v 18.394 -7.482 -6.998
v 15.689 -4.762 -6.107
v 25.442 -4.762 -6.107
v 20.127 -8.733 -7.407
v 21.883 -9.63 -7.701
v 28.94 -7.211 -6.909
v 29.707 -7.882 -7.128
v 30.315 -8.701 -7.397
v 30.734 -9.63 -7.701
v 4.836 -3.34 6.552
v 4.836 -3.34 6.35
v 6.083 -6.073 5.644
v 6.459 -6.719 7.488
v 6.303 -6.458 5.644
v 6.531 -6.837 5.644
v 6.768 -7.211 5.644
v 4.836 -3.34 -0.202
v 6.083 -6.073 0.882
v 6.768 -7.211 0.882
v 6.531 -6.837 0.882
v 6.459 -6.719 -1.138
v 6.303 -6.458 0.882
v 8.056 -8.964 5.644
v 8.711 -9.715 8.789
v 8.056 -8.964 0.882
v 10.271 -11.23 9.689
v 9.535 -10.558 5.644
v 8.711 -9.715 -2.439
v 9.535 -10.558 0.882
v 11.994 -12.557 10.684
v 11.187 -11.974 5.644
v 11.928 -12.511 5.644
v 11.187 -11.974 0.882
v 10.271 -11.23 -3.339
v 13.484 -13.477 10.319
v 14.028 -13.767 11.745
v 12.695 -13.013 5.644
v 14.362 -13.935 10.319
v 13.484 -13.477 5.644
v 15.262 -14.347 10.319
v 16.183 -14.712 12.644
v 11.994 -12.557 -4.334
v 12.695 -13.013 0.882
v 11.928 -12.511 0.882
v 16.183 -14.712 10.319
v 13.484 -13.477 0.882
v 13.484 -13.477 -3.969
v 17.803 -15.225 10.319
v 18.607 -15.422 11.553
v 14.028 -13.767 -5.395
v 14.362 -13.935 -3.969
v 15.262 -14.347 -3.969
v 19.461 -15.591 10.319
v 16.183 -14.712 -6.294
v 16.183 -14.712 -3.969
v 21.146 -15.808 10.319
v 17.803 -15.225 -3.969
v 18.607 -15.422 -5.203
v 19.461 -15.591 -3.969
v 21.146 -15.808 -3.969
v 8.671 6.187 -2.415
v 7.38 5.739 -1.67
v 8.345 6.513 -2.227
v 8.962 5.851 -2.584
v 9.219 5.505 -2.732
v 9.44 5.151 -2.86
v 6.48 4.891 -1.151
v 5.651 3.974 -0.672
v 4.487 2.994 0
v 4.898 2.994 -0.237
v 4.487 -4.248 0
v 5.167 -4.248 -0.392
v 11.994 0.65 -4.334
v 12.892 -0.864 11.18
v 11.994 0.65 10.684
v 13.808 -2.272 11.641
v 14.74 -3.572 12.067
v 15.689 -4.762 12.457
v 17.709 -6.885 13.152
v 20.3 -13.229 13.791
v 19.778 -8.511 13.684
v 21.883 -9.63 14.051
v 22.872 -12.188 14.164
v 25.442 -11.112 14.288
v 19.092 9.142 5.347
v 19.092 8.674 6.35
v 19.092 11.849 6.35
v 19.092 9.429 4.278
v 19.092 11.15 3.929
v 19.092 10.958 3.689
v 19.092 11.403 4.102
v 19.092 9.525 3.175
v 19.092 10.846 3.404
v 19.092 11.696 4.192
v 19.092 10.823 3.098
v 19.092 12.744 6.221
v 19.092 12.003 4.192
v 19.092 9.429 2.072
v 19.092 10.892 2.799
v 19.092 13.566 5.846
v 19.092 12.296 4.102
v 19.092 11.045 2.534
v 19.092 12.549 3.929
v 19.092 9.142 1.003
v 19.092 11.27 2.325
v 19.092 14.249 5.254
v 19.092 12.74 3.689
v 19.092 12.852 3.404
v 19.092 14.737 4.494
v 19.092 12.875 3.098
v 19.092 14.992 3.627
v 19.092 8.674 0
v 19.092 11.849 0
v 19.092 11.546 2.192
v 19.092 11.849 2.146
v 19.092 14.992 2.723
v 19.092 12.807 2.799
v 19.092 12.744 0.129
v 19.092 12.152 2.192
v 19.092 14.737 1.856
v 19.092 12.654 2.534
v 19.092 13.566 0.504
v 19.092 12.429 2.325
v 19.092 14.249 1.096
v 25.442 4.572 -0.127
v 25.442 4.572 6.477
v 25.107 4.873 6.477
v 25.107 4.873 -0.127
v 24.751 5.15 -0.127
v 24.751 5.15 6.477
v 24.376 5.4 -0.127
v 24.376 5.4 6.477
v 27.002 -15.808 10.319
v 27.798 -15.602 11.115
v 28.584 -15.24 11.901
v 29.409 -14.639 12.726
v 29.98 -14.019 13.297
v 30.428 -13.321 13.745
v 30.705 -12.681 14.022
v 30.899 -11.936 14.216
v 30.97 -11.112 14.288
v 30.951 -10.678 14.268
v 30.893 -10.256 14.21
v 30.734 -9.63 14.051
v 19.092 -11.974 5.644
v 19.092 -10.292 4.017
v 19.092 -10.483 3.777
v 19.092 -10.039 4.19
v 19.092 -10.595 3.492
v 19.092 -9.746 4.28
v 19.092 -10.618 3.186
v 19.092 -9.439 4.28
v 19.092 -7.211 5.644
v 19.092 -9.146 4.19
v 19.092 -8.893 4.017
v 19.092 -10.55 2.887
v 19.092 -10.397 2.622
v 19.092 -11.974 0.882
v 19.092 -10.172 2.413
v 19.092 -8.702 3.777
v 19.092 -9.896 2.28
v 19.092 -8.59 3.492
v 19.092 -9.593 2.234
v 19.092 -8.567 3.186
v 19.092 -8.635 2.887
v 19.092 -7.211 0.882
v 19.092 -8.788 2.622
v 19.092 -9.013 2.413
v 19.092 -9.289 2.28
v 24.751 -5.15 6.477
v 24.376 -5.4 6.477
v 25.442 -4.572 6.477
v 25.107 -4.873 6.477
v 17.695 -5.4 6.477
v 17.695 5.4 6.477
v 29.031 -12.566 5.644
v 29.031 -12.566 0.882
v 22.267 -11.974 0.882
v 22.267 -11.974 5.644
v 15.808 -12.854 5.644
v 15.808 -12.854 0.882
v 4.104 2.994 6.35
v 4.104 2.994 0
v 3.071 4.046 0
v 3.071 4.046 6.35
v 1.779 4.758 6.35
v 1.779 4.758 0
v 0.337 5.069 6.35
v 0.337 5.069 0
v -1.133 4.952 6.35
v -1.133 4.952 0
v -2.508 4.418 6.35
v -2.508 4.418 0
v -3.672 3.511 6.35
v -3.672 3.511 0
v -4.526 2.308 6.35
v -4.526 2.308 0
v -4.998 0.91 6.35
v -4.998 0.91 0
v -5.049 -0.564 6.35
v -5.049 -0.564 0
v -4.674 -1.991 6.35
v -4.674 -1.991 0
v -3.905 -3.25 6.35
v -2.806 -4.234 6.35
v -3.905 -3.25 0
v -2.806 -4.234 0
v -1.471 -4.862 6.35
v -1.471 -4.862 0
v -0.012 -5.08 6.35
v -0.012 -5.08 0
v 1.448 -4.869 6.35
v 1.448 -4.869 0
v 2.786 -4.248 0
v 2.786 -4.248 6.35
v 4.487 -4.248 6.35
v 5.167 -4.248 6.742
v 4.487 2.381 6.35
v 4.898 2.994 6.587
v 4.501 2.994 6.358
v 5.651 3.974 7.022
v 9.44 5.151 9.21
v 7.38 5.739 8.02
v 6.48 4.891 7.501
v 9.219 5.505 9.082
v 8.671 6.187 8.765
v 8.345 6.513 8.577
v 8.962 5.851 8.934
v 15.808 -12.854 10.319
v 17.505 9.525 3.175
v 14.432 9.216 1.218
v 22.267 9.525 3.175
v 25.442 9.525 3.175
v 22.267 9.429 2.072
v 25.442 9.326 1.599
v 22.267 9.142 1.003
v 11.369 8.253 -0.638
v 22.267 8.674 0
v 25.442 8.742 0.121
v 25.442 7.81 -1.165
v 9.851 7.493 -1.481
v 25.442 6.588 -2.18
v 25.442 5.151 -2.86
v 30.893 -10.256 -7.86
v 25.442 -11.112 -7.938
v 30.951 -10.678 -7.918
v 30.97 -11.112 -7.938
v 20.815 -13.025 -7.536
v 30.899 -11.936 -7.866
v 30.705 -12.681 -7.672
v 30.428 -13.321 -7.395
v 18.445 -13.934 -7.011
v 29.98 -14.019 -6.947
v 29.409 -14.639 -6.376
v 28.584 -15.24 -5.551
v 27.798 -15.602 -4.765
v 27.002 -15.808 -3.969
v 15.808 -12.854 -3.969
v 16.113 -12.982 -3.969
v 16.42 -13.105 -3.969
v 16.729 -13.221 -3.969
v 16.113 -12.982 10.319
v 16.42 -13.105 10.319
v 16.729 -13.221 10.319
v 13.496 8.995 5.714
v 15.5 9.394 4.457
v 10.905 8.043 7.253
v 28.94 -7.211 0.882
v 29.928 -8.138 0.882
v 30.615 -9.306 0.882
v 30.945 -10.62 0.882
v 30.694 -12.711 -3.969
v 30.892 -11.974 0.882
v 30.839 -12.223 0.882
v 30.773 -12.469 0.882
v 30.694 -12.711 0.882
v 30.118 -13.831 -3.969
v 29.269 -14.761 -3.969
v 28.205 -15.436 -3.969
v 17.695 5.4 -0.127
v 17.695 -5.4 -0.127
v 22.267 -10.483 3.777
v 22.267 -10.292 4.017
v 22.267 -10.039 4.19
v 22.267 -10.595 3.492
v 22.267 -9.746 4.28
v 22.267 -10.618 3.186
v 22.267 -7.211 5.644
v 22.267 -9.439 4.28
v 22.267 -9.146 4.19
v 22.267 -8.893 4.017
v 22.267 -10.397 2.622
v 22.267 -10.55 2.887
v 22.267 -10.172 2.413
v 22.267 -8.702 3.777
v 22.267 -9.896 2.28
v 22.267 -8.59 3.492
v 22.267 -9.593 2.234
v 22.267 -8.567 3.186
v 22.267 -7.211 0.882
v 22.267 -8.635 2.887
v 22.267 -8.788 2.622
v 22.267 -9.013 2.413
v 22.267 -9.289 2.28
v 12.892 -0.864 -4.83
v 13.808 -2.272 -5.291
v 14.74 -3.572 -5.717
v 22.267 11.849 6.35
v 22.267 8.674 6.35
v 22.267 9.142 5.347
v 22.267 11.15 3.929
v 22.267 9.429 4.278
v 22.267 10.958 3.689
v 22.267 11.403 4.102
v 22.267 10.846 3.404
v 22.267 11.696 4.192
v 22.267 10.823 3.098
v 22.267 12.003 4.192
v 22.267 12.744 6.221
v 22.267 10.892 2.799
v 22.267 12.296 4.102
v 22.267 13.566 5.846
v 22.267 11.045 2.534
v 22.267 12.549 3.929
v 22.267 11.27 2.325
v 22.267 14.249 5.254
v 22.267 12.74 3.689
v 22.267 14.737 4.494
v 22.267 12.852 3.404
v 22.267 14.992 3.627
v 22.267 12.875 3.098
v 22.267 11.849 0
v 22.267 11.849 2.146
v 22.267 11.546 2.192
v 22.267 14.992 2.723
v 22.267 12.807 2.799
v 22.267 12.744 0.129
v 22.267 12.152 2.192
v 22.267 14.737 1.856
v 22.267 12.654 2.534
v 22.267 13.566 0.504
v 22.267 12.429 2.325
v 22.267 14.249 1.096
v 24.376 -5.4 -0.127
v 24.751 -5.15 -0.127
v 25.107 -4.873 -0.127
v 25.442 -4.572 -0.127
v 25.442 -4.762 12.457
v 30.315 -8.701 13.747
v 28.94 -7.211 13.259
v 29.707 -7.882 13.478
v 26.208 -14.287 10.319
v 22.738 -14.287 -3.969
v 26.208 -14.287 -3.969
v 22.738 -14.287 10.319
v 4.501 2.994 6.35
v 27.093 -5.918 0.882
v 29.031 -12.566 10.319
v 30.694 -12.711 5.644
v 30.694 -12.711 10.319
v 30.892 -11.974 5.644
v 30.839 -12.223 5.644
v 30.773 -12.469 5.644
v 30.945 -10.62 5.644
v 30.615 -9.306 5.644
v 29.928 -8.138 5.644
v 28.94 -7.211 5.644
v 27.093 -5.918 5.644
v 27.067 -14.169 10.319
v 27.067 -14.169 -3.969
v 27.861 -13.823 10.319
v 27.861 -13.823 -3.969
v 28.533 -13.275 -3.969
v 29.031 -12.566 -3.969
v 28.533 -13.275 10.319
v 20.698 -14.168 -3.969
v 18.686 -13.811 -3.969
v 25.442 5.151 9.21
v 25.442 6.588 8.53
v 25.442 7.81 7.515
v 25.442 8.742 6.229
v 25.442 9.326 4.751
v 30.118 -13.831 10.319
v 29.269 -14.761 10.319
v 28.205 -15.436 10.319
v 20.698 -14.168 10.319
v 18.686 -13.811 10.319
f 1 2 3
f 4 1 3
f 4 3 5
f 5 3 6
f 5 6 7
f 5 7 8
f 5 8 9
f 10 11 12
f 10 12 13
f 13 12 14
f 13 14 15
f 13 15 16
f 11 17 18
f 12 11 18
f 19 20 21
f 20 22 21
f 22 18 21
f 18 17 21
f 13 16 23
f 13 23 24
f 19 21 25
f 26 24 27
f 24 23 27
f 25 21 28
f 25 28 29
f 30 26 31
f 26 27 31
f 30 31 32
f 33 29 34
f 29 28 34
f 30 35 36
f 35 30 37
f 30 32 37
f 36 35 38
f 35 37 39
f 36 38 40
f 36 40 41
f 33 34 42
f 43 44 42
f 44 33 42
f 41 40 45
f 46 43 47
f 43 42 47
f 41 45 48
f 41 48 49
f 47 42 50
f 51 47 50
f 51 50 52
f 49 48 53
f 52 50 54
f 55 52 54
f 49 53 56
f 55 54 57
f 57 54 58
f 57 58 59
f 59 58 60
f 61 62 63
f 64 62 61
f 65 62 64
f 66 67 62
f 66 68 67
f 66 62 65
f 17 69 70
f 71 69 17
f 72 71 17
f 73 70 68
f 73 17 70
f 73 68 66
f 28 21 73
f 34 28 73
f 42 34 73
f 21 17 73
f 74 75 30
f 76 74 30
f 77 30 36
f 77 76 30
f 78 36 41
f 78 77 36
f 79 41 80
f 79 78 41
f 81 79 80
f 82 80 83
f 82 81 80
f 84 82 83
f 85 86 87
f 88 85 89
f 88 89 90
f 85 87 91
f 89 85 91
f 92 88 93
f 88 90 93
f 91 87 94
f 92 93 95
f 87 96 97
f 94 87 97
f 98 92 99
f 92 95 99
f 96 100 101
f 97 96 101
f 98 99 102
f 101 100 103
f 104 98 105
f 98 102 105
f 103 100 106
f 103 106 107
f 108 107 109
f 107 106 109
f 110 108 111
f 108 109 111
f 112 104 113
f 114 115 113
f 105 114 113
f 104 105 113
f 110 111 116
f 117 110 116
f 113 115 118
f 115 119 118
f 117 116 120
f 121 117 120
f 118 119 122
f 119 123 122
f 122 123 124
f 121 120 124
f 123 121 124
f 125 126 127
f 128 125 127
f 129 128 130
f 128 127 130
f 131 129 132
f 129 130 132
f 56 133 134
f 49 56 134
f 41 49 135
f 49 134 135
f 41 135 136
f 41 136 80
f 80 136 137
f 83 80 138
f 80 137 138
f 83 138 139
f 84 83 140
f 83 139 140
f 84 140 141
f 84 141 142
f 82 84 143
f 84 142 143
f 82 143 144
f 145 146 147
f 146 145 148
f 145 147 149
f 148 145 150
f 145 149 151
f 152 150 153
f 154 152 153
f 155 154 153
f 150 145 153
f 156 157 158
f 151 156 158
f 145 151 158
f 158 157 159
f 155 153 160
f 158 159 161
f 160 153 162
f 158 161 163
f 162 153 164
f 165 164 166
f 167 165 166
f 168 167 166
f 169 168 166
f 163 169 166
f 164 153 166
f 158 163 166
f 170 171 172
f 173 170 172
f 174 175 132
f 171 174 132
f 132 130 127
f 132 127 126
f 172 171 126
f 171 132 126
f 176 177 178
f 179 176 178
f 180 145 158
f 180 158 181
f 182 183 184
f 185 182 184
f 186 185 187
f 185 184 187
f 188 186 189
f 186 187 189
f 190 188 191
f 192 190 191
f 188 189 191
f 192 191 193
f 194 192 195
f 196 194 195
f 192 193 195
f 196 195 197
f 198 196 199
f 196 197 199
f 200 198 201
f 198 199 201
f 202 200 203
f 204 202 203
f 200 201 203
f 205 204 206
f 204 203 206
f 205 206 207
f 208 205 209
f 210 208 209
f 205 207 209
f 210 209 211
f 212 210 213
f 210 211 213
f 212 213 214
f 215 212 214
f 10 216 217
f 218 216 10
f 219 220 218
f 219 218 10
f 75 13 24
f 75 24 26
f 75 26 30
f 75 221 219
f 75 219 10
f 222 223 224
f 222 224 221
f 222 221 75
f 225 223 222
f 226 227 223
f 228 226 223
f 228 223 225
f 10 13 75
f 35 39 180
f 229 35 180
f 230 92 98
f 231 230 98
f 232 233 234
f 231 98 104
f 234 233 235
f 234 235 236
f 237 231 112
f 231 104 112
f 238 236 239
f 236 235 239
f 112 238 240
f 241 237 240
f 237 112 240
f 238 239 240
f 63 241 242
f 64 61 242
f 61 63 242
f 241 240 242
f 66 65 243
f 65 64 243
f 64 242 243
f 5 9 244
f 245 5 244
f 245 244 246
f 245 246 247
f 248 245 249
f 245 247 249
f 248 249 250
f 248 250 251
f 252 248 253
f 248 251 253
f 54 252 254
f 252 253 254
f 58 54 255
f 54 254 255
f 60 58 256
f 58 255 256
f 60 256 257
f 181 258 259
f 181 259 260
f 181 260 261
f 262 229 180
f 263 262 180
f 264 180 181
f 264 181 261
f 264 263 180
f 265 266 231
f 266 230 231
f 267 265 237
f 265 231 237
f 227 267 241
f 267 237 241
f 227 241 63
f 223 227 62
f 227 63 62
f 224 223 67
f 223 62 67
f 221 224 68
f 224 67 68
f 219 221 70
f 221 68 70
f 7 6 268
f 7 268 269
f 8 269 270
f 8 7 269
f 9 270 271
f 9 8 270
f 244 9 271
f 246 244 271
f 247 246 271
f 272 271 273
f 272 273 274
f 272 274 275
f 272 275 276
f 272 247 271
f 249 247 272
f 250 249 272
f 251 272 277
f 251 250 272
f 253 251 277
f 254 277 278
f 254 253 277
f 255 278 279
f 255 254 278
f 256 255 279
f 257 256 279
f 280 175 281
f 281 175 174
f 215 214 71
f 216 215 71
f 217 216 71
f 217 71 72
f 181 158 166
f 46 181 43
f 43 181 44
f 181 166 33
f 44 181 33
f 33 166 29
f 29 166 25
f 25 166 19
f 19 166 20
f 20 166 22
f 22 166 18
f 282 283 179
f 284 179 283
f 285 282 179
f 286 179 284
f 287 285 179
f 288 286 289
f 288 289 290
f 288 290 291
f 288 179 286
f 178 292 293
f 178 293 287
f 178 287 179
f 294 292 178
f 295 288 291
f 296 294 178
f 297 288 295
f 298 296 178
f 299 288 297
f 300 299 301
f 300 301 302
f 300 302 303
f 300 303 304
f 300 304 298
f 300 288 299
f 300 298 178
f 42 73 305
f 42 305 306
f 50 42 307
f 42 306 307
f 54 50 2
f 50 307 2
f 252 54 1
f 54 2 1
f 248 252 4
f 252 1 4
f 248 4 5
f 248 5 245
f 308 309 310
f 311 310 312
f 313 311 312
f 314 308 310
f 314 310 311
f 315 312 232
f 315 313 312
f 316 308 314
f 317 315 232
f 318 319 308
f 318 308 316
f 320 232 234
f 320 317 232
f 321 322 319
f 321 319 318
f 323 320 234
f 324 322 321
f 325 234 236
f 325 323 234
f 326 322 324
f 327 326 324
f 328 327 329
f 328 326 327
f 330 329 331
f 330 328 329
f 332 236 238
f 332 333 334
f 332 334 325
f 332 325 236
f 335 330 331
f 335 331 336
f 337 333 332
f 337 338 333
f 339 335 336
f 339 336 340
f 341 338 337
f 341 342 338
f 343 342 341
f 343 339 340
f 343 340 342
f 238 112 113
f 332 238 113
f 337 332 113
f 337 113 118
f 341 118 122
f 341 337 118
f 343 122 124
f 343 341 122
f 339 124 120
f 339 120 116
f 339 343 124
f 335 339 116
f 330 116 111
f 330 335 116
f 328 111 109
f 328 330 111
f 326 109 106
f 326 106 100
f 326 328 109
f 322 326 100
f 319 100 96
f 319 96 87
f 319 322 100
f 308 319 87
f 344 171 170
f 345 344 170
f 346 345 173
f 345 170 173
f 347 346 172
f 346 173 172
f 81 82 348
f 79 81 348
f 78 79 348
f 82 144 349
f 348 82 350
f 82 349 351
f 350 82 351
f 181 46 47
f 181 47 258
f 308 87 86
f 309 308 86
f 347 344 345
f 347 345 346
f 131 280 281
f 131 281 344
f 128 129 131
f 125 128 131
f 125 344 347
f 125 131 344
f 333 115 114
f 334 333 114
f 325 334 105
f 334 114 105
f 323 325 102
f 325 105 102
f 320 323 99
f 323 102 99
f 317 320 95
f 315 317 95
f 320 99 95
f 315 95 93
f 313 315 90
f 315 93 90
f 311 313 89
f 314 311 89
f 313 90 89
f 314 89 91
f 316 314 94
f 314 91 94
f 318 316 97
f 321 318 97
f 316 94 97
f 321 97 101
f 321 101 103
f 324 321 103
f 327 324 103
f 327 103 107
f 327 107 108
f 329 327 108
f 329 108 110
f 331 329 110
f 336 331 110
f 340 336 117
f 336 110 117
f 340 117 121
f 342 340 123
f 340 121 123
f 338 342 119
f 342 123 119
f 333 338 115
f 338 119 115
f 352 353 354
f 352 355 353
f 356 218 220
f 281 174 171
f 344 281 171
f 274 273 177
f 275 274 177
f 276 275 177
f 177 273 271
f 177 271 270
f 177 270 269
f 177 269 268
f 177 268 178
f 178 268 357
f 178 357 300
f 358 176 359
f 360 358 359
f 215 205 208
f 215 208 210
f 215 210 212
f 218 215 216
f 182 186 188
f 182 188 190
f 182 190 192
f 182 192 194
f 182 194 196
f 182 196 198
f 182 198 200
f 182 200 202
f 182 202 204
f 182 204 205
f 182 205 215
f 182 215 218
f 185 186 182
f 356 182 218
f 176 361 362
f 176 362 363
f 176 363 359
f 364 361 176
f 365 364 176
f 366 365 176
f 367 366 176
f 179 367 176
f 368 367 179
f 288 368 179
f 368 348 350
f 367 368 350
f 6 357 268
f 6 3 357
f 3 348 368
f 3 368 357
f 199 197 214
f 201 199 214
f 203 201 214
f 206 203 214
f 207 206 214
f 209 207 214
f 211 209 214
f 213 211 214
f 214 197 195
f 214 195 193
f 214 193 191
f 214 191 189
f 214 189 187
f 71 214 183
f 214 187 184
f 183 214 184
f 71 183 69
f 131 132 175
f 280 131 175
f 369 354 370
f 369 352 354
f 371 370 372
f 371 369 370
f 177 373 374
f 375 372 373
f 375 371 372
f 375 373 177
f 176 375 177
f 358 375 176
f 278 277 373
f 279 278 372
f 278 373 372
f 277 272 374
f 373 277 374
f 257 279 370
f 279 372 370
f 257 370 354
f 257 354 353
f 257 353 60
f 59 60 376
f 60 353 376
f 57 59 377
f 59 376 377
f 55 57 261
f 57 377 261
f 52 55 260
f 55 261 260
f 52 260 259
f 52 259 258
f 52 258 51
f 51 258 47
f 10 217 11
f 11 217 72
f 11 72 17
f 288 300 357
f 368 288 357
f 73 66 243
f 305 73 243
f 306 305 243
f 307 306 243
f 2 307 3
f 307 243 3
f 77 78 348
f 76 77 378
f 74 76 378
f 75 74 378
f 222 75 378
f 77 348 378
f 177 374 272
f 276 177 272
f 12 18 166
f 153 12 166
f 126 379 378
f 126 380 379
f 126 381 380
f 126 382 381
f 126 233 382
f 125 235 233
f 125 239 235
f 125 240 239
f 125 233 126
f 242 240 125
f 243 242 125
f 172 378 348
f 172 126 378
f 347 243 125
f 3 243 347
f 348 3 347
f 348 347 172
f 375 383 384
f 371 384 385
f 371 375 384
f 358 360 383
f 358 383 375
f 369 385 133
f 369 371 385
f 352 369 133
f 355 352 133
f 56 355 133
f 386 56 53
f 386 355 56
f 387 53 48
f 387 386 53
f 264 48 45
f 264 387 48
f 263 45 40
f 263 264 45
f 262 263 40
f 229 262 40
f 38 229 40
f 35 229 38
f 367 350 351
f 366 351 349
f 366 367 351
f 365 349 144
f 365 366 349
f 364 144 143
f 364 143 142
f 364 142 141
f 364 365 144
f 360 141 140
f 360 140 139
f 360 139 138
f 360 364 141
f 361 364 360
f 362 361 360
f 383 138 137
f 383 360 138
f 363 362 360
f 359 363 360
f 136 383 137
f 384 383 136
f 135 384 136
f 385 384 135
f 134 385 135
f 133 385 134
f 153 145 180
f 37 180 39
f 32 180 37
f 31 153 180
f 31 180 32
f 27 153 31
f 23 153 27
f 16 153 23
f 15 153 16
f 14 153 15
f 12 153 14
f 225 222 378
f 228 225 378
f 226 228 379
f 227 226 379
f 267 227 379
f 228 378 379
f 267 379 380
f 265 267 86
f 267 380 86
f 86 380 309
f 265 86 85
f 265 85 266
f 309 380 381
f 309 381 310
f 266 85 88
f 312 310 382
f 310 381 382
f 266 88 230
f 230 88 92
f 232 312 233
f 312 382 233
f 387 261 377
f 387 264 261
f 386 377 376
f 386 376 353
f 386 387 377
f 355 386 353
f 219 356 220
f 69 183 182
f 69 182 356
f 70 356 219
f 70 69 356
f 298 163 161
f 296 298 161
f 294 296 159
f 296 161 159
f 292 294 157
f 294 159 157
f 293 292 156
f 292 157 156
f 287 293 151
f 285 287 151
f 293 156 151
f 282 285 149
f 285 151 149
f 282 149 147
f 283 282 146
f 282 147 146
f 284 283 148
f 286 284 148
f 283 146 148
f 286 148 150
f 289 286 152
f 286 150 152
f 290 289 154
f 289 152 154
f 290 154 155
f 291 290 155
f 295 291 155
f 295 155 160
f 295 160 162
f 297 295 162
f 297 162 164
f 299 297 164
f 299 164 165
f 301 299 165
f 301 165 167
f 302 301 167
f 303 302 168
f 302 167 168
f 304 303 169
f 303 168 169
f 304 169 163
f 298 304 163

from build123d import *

# Parameters (mm, degrees)
BOSS_EXTRUDE1_DEPTH      = 6.35
BOSS_EXTRUDE2_START      = -7.9375
BOSS_EXTRUDE2_DEPTH      = 22.225
CUT_EXTRUDE1_DEPTH       = 51.557144521
CUT_EXTRUDE2_START       = -7.9375
CUT_EXTRUDE2_DEPTH       = 25.24
CUT_EXTRUDE7_DEPTH       = 10
CUT_EXTRUDE7_DEPTH_BACK  = 19.05
CUT_EXTRUDE10_DEPTH      = 10.16
CUT_EXTRUDE10_DEPTH_BACK = 17.78
CUT_EXTRUDE8_START       = 0.127
CUT_EXTRUDE8_DEPTH       = 6.604
BOSS_EXTRUDE3_START      = -3.175
BOSS_EXTRUDE3_DEPTH      = 3.175
SKETCH14_W               = 1.0287
SKETCH14_H               = 3.176
SKETCH15_W               = 4.7625
SKETCH15_H               = 4.7625
CUT_EXTRUDE15_DEPTH      = 8.703074479
CUT_EXTRUDE16_START      = -3.175
SKETCH16_W               = 4.7625
SKETCH16_H               = 4.7625
CUT_EXTRUDE16_DEPTH      = 32.52405251
SKETCH18_W               = 1.0287
SKETCH18_H               = 3.176
CUT_EXTRUDE17_DEPTH      = 4.7625
BOSS_EXTRUDE5_REACH      = 39.621
BOSS_EXTRUDE6_DEPTH      = 6.35
BOSS_EXTRUDE8_REACH      = 39.621
CUT_EXTRUDE19_DEPTH      = 10.31875
CUT_EXTRUDE19_DEPTH_BACK = 3.96875


with BuildPart() as part:
    # Sketch2 → Boss-Extrude1 (new body)
    with BuildSketch(Plane.XY):
        with BuildLine():
            Line((4.487320853, -2.38125), (4.487320853, 2.38125))
            ThreePointArc((4.487320853, 2.38125), (-5.08, 0), (4.487320853, -2.38125))
        make_face()
    extrude(amount=BOSS_EXTRUDE1_DEPTH)


with BuildPart() as body_2:
    # Sketch3 → Boss-Extrude2 (new body)
    with BuildSketch(Plane.XY.offset(BOSS_EXTRUDE2_START)):
        Polygon((4.487320853, 9.525), (25.442320853, 9.525), (25.442320853, -4.7625), (41.312615578, -15.875), (25.442320853, -15.875), (4.487320853, -15.875), align=None)
    extrude(amount=BOSS_EXTRUDE2_DEPTH)

    # Sketch4 → Cut-Extrude1 (cut, through all)
    with BuildSketch(Plane(origin=(0, 9.525, 0), x_dir=(1, 0, 0), z_dir=(0, 1, 0))):
        with BuildLine():
            Line((4.487320853, -6.35), (11.994161802, -10.684076643))
            ThreePointArc((11.994161802, -10.684076643), (18.481041485, -13.371030185), (25.442320853, -14.2875))
            Line((25.442320853, -14.2875), (4.487320853, -14.2875))
            Line((4.487320853, -14.2875), (4.487320853, -6.35))
        make_face()
        with BuildLine():
            Line((4.487320853, 0), (11.994161802, 4.334076643))
            ThreePointArc((11.994161802, 4.334076643), (18.481041485, 7.021030185), (25.442320853, 7.9375))
            Line((25.442320853, 7.9375), (4.487320853, 7.9375))
            Line((4.487320853, 7.9375), (4.487320853, 0))
        make_face()
    extrude(amount=-CUT_EXTRUDE1_DEPTH, mode=Mode.SUBTRACT)

    # Sketch5 → Cut-Extrude2 (cut)
    with BuildSketch(Plane.XY.offset(CUT_EXTRUDE2_START)):
        with BuildLine():
            Line((4.487320853, -15.875), (4.487320853, -2.38125))
            Line((4.487320853, -2.38125), (4.836453379, -3.34048373))
            ThreePointArc((4.836453379, -3.34048373), (11.810966692, -12.429846444), (22.737597804, -15.875))
            Line((22.737597804, -15.875), (4.487320853, -15.875))
        make_face()
        with BuildLine():
            Line((4.487320853, 2.38125), (4.487320853, 9.525))
            Line((4.487320853, 9.525), (17.504820853, 9.525))
            ThreePointArc((17.504820853, 9.525), (10.080393765, 7.621692137), (4.487320853, 2.38125))
        make_face()
        with BuildLine():
            Line((26.207895332, -15.875), (41.312615578, -15.875))
            Line((41.312615578, -15.875), (28.93955311, -7.211288389))
            ThreePointArc((28.93955311, -7.211288389), (30.74997231, -12.54461137), (26.207895332, -15.875))
        make_face()
    extrude(amount=CUT_EXTRUDE2_DEPTH, mode=Mode.SUBTRACT)

    # Sketch7 → Cut-Extrude7 (cut, two sides)
    with BuildSketch(Plane(origin=(25.442320853, 0, 0), x_dir=(0, 0, -1), z_dir=(1, 0, 0))) as cut_extrude7_sk:
        with BuildLine():
            ThreePointArc((-9.525, -15.875), (-12.892596049, -14.480096041), (-14.2875, -11.112499989))
            Line((-14.2875, -11.112499989), (-14.2875, -15.875))
            Line((-14.2875, -15.875), (-9.525, -15.875))
        make_face()
        with BuildLine():
            ThreePointArc((7.9375, -11.112499982), (6.542596052, -14.480096039), (3.175, -15.875))
            Line((3.175, -15.875), (7.9375, -15.875))
            Line((7.9375, -15.875), (7.9375, -11.112499982))
        make_face()
    extrude(amount=CUT_EXTRUDE7_DEPTH, mode=Mode.SUBTRACT)
    extrude(cut_extrude7_sk.sketch, amount=-CUT_EXTRUDE7_DEPTH_BACK, mode=Mode.SUBTRACT)

    # Sketch7<4> → Cut-Extrude10 (cut, two sides)
    with BuildSketch(Plane(origin=(25.442320853, 0, 0), x_dir=(0, 0, -1), z_dir=(1, 0, 0))) as cut_extrude10_sk:
        with BuildLine():
            ThreePointArc((-9.209570672, 5.151475854), (-6.901384194, 8.316649622), (-3.175, 9.525))
            Line((-3.175, 9.525), (-14.2875, 9.525))
            Line((-14.2875, 9.525), (-14.2875, -4.7625))
            Line((-14.2875, -4.7625), (-12.456650698, -4.7625))
            Line((-12.456650698, -4.7625), (-9.209570672, 5.151475854))
        make_face()
        with BuildLine():
            Line((6.106650698, -4.7625), (7.9375, -4.7625))
            Line((7.9375, -4.7625), (7.9375, 9.525))
            Line((7.9375, 9.525), (-3.175, 9.525))
            ThreePointArc((-3.175, 9.525), (0.551384194, 8.316649622), (2.859570672, 5.151475854))
            Line((2.859570672, 5.151475854), (6.106650698, -4.7625))
        make_face()
        with BuildLine():
            ThreePointArc((7.700928004, -9.630143109), (7.877985134, -10.361942155), (7.9375, -11.112499982))
            Line((7.9375, -11.112499982), (7.9375, -4.7625))
            Line((7.9375, -4.7625), (6.106650698, -4.7625))
            Line((6.106650698, -4.7625), (7.700928004, -9.630143109))
        make_face()
        with BuildLine():
            Line((-14.050928004, -9.630143109), (-12.456650698, -4.7625))
            Line((-12.456650698, -4.7625), (-14.2875, -4.7625))
            Line((-14.2875, -4.7625), (-14.2875, -11.112499989))
            ThreePointArc((-14.2875, -11.112499989), (-14.227985135, -10.361942158), (-14.050928004, -9.630143109))
        make_face()
    extrude(amount=CUT_EXTRUDE10_DEPTH, mode=Mode.SUBTRACT)
    extrude(cut_extrude10_sk.sketch, amount=-CUT_EXTRUDE10_DEPTH_BACK, mode=Mode.SUBTRACT)

    # Sketch8 → Cut-Extrude8 (cut)
    with BuildSketch(Plane.XY.offset(6.35).offset(CUT_EXTRUDE8_START)):
        with BuildLine():
            Line((25.442320853, -4.572), (25.442320853, 4.572))
            ThreePointArc((25.442320853, 4.572), (24.931170577, 5.014670211), (24.375846843, 5.400477249))
            Line((24.375846843, 5.400477249), (17.695324263, 5.400477249))
            Line((17.695324263, 5.400477249), (17.695324263, -5.400477249))
            Line((17.695324263, -5.400477249), (24.375846843, -5.400477249))
            ThreePointArc((24.375846843, -5.400477249), (24.931170577, -5.014670211), (25.442320853, -4.572))
        make_face()
    extrude(amount=-CUT_EXTRUDE8_DEPTH, mode=Mode.SUBTRACT)

    # Sketch12 → Boss-Extrude3 (add)
    with BuildSketch(Plane(origin=(25.442320853, 0, 0), x_dir=(0, 0, -1), z_dir=(1, 0, 0)).offset(BOSS_EXTRUDE3_START)):
        with BuildLine():
            Line((-6.35, 8.674261314), (0, 8.674261314))
            Line((0, 8.674261314), (0, 11.849261314))
            ThreePointArc((0, 11.849261314), (-3.175, 15.024261314), (-6.35, 11.849261314))
            Line((-6.35, 11.849261314), (-6.35, 8.674261314))
        make_face()
    extrude(amount=-BOSS_EXTRUDE3_DEPTH)

    # Sketch14 → #1 Clearance Hole1 (revolve, cut)
    with BuildSketch(Plane(origin=(22.267320853, 11.849261314, 3.175), x_dir=(0, 0, -1), z_dir=(0, 1, 0))):
        with Locations((0.51435, 1.588)):
            Rectangle(SKETCH14_W, SKETCH14_H)
    revolve(axis=Axis((28.617320853, 11.849261314, 3.175), (-1, 0, 0)), mode=Mode.SUBTRACT)

    # Sketch15 → Cut-Extrude15 (cut)
    with BuildSketch(Plane(origin=(30.970395332, 0, 0), x_dir=(0, 0, -1), z_dir=(1, 0, 0))):
        with Locations((-3.262930867, -9.592538389)):
            Rectangle(SKETCH15_W, SKETCH15_H)
    extrude(amount=-CUT_EXTRUDE15_DEPTH, mode=Mode.SUBTRACT)

    # Sketch16 → Cut-Extrude16 (cut, through all)
    with BuildSketch(Plane(origin=(22.267320853, 0, 0), x_dir=(0, 0, -1), z_dir=(1, 0, 0)).offset(CUT_EXTRUDE16_START)):
        with Locations((-3.262930867, -9.592538389)):
            Rectangle(SKETCH16_W, SKETCH16_H)
    extrude(amount=-CUT_EXTRUDE16_DEPTH, mode=Mode.SUBTRACT)

    # Sketch18 → #1 Clearance Hole2 (revolve, cut)
    with BuildSketch(Plane(origin=(22.267320853, -9.592538389, 3.262930867), x_dir=(0, 0, -1), z_dir=(0, 1, 0))):
        with Locations((0.51435, 1.588)):
            Rectangle(SKETCH18_W, SKETCH18_H)
    revolve(axis=Axis((28.617320853, -9.592538389, 3.262930867), (-1, 0, 0)), mode=Mode.SUBTRACT)

    # Sketch19 → Cut-Extrude17 (cut)
    with BuildSketch(Plane.XY.offset(0.881680867)):
        with BuildLine():
            Line((19.092320853, -11.973788389), (13.48400503, -13.476532085))
            ThreePointArc((13.48400503, -13.476532085), (9.265001461, -10.293171657), (6.083027043, -6.07312266))
            Line((6.083027043, -6.07312266), (19.092320853, -7.211288389))
            Line((19.092320853, -7.211288389), (19.092320853, -11.973788389))
        make_face()
        with BuildLine():
            Line((22.267320853, -7.211288389), (27.092931392, -5.918269942))
            Line((27.092931392, -5.918269942), (28.93955311, -7.211288389))
            ThreePointArc((28.93955311, -7.211288389), (30.745098667, -9.665022145), (30.694106103, -12.711036568))
            Line((30.694106103, -12.711036568), (22.267320853, -11.973788389))
            Line((22.267320853, -11.973788389), (22.267320853, -7.211288389))
        make_face()
    extrude(amount=CUT_EXTRUDE17_DEPTH, mode=Mode.SUBTRACT)

    # Boss-Extrude5: up to this face of the body (flat: up to its plane)
    boss_extrude5_end = Plane(body_2.part.faces().sort_by_distance((8.620061627, -2.410659079, -2.386038999))[0])
    # Sketch21 → Boss-Extrude5 (add, up to the picked face)
    with BuildSketch(Plane(origin=(0, 0, 0), x_dir=(-1, 0, 0), z_dir=(0, 0, -1)), mode=Mode.PRIVATE) as boss_extrude5_sk1:
        with BuildLine():
            Line((-4.487320853, 2.38125), (-4.487320853, 2.993520531))
            Line((-4.487320853, 2.993520531), (-4.898044681, 2.993520531))
            ThreePointArc((-4.898044681, 2.993520531), (-4.689025867, 2.689838391), (-4.487320853, 2.38125))
        make_face()
    boss_extrude5_tool1 = split(extrude(boss_extrude5_sk1.sketch, amount=BOSS_EXTRUDE5_REACH, mode=Mode.PRIVATE), bisect_by=boss_extrude5_end, keep=Keep.BOTH, mode=Mode.PRIVATE)
    # Sketch21 → Boss-Extrude5 (add, up to the picked face)
    with BuildSketch(Plane(origin=(0, 0, 0), x_dir=(-1, 0, 0), z_dir=(0, 0, -1)), mode=Mode.PRIVATE) as boss_extrude5_sk2:
        Polygon((-4.487320853, -2.38125), (-5.166825139, -4.248172683), (-4.487320853, -4.248172683), align=None)
    boss_extrude5_tool2 = split(extrude(boss_extrude5_sk2.sketch, amount=BOSS_EXTRUDE5_REACH, mode=Mode.PRIVATE), bisect_by=boss_extrude5_end, keep=Keep.BOTH, mode=Mode.PRIVATE)

    add(part.part)  # Boss-Extrude5 merges part
    add(boss_extrude5_tool1.solids().sort_by(Axis((4.623055, 2.791201, 0), (0, 0, -1)))[0])
    add(boss_extrude5_tool2.solids().sort_by(Axis((4.713822, -3.625865, 0), (0, 0, -1)))[0])

    # Sketch21<3> → Boss-Extrude6 (add)
    with BuildSketch(Plane(origin=(0, 0, 0), x_dir=(-1, 0, 0), z_dir=(0, 0, -1))):
        with BuildLine():
            Line((-5.166825139, -4.248172683), (-4.487320853, -2.38125))
            ThreePointArc((-4.487320853, -2.38125), (-3.754344697, -3.42217707), (-2.785575139, -4.248172683))
            Line((-2.785575139, -4.248172683), (-5.166825139, -4.248172683))
        make_face()
        with BuildLine():
            Line((-4.104294681, 2.993520531), (-4.898044681, 2.993520531))
            ThreePointArc((-4.898044681, 2.993520531), (-4.689025867, 2.689838391), (-4.487320853, 2.38125))
            ThreePointArc((-4.487320853, 2.38125), (-4.306702123, 2.694200592), (-4.104294681, 2.993520531))
        make_face()
    extrude(amount=-BOSS_EXTRUDE6_DEPTH)

    # Boss-Extrude8: up to this face of the body (flat: up to its plane)
    boss_extrude8_end = Plane(body_2.part.faces().sort_by_distance((8.620061627, -2.410659079, 8.736038999))[0])
    # Sketch22 → Boss-Extrude8 (add, up to the picked face)
    with BuildSketch(Plane.XY.offset(6.35), mode=Mode.PRIVATE) as boss_extrude8_sk1:
        Polygon((4.487320853, 2.38125), (4.501169681, 2.993520531), (4.898044681, 2.993520531), align=None)
    boss_extrude8_tool1 = split(extrude(boss_extrude8_sk1.sketch, amount=BOSS_EXTRUDE8_REACH, mode=Mode.PRIVATE), bisect_by=boss_extrude8_end, keep=Keep.BOTH, mode=Mode.PRIVATE)
    # Sketch22 → Boss-Extrude8 (add, up to the picked face)
    with BuildSketch(Plane.XY.offset(6.35), mode=Mode.PRIVATE) as boss_extrude8_sk2:
        Polygon((4.487320853, -2.38125), (4.487320853, -4.248172683), (5.166825139, -4.248172683), align=None)
    boss_extrude8_tool2 = split(extrude(boss_extrude8_sk2.sketch, amount=BOSS_EXTRUDE8_REACH, mode=Mode.PRIVATE), bisect_by=boss_extrude8_end, keep=Keep.BOTH, mode=Mode.PRIVATE)
    add(boss_extrude8_tool1.solids().sort_by(Axis((4.628845, 2.78943, 6.35), (0, 0, 1)))[0])
    add(boss_extrude8_tool2.solids().sort_by(Axis((4.713822, -3.625865, 6.35), (0, 0, 1)))[0])

    # Sketch28 → Cut-Extrude19 (cut, two sides)
    with BuildSketch(Plane.XY) as cut_extrude19_sk:
        with BuildLine():
            Line((29.030898019, -12.565524716), (30.694106103, -12.711036568))
            ThreePointArc((30.694106103, -12.711036568), (28.952742854, -15.004442745), (26.207895332, -15.875))
            Line((26.207895332, -15.875), (22.737597804, -15.875))
            ThreePointArc((22.737597804, -15.875), (19.409236601, -15.581985677), (16.183264637, -14.711956609))
            ThreePointArc((16.183264637, -14.711956609), (14.809533786, -14.146902347), (13.48400503, -13.476532085))
            Line((13.48400503, -13.476532085), (15.808154767, -12.85377804))
            ThreePointArc((15.808154767, -12.85377804), (16.266196274, -13.044120459), (16.729459067, -13.221376891))
            ThreePointArc((16.729459067, -13.221376891), (19.686600035, -14.018903538), (22.737597804, -14.2875))
            Line((22.737597804, -14.2875), (26.207895332, -14.2875))
            ThreePointArc((26.207895332, -14.2875), (27.861266362, -13.823033017), (29.030898019, -12.565524716))
        make_face()
    extrude(amount=CUT_EXTRUDE19_DEPTH, mode=Mode.SUBTRACT)
    extrude(cut_extrude19_sk.sketch, amount=-CUT_EXTRUDE19_DEPTH_BACK, mode=Mode.SUBTRACT)


solid = body_2.part
